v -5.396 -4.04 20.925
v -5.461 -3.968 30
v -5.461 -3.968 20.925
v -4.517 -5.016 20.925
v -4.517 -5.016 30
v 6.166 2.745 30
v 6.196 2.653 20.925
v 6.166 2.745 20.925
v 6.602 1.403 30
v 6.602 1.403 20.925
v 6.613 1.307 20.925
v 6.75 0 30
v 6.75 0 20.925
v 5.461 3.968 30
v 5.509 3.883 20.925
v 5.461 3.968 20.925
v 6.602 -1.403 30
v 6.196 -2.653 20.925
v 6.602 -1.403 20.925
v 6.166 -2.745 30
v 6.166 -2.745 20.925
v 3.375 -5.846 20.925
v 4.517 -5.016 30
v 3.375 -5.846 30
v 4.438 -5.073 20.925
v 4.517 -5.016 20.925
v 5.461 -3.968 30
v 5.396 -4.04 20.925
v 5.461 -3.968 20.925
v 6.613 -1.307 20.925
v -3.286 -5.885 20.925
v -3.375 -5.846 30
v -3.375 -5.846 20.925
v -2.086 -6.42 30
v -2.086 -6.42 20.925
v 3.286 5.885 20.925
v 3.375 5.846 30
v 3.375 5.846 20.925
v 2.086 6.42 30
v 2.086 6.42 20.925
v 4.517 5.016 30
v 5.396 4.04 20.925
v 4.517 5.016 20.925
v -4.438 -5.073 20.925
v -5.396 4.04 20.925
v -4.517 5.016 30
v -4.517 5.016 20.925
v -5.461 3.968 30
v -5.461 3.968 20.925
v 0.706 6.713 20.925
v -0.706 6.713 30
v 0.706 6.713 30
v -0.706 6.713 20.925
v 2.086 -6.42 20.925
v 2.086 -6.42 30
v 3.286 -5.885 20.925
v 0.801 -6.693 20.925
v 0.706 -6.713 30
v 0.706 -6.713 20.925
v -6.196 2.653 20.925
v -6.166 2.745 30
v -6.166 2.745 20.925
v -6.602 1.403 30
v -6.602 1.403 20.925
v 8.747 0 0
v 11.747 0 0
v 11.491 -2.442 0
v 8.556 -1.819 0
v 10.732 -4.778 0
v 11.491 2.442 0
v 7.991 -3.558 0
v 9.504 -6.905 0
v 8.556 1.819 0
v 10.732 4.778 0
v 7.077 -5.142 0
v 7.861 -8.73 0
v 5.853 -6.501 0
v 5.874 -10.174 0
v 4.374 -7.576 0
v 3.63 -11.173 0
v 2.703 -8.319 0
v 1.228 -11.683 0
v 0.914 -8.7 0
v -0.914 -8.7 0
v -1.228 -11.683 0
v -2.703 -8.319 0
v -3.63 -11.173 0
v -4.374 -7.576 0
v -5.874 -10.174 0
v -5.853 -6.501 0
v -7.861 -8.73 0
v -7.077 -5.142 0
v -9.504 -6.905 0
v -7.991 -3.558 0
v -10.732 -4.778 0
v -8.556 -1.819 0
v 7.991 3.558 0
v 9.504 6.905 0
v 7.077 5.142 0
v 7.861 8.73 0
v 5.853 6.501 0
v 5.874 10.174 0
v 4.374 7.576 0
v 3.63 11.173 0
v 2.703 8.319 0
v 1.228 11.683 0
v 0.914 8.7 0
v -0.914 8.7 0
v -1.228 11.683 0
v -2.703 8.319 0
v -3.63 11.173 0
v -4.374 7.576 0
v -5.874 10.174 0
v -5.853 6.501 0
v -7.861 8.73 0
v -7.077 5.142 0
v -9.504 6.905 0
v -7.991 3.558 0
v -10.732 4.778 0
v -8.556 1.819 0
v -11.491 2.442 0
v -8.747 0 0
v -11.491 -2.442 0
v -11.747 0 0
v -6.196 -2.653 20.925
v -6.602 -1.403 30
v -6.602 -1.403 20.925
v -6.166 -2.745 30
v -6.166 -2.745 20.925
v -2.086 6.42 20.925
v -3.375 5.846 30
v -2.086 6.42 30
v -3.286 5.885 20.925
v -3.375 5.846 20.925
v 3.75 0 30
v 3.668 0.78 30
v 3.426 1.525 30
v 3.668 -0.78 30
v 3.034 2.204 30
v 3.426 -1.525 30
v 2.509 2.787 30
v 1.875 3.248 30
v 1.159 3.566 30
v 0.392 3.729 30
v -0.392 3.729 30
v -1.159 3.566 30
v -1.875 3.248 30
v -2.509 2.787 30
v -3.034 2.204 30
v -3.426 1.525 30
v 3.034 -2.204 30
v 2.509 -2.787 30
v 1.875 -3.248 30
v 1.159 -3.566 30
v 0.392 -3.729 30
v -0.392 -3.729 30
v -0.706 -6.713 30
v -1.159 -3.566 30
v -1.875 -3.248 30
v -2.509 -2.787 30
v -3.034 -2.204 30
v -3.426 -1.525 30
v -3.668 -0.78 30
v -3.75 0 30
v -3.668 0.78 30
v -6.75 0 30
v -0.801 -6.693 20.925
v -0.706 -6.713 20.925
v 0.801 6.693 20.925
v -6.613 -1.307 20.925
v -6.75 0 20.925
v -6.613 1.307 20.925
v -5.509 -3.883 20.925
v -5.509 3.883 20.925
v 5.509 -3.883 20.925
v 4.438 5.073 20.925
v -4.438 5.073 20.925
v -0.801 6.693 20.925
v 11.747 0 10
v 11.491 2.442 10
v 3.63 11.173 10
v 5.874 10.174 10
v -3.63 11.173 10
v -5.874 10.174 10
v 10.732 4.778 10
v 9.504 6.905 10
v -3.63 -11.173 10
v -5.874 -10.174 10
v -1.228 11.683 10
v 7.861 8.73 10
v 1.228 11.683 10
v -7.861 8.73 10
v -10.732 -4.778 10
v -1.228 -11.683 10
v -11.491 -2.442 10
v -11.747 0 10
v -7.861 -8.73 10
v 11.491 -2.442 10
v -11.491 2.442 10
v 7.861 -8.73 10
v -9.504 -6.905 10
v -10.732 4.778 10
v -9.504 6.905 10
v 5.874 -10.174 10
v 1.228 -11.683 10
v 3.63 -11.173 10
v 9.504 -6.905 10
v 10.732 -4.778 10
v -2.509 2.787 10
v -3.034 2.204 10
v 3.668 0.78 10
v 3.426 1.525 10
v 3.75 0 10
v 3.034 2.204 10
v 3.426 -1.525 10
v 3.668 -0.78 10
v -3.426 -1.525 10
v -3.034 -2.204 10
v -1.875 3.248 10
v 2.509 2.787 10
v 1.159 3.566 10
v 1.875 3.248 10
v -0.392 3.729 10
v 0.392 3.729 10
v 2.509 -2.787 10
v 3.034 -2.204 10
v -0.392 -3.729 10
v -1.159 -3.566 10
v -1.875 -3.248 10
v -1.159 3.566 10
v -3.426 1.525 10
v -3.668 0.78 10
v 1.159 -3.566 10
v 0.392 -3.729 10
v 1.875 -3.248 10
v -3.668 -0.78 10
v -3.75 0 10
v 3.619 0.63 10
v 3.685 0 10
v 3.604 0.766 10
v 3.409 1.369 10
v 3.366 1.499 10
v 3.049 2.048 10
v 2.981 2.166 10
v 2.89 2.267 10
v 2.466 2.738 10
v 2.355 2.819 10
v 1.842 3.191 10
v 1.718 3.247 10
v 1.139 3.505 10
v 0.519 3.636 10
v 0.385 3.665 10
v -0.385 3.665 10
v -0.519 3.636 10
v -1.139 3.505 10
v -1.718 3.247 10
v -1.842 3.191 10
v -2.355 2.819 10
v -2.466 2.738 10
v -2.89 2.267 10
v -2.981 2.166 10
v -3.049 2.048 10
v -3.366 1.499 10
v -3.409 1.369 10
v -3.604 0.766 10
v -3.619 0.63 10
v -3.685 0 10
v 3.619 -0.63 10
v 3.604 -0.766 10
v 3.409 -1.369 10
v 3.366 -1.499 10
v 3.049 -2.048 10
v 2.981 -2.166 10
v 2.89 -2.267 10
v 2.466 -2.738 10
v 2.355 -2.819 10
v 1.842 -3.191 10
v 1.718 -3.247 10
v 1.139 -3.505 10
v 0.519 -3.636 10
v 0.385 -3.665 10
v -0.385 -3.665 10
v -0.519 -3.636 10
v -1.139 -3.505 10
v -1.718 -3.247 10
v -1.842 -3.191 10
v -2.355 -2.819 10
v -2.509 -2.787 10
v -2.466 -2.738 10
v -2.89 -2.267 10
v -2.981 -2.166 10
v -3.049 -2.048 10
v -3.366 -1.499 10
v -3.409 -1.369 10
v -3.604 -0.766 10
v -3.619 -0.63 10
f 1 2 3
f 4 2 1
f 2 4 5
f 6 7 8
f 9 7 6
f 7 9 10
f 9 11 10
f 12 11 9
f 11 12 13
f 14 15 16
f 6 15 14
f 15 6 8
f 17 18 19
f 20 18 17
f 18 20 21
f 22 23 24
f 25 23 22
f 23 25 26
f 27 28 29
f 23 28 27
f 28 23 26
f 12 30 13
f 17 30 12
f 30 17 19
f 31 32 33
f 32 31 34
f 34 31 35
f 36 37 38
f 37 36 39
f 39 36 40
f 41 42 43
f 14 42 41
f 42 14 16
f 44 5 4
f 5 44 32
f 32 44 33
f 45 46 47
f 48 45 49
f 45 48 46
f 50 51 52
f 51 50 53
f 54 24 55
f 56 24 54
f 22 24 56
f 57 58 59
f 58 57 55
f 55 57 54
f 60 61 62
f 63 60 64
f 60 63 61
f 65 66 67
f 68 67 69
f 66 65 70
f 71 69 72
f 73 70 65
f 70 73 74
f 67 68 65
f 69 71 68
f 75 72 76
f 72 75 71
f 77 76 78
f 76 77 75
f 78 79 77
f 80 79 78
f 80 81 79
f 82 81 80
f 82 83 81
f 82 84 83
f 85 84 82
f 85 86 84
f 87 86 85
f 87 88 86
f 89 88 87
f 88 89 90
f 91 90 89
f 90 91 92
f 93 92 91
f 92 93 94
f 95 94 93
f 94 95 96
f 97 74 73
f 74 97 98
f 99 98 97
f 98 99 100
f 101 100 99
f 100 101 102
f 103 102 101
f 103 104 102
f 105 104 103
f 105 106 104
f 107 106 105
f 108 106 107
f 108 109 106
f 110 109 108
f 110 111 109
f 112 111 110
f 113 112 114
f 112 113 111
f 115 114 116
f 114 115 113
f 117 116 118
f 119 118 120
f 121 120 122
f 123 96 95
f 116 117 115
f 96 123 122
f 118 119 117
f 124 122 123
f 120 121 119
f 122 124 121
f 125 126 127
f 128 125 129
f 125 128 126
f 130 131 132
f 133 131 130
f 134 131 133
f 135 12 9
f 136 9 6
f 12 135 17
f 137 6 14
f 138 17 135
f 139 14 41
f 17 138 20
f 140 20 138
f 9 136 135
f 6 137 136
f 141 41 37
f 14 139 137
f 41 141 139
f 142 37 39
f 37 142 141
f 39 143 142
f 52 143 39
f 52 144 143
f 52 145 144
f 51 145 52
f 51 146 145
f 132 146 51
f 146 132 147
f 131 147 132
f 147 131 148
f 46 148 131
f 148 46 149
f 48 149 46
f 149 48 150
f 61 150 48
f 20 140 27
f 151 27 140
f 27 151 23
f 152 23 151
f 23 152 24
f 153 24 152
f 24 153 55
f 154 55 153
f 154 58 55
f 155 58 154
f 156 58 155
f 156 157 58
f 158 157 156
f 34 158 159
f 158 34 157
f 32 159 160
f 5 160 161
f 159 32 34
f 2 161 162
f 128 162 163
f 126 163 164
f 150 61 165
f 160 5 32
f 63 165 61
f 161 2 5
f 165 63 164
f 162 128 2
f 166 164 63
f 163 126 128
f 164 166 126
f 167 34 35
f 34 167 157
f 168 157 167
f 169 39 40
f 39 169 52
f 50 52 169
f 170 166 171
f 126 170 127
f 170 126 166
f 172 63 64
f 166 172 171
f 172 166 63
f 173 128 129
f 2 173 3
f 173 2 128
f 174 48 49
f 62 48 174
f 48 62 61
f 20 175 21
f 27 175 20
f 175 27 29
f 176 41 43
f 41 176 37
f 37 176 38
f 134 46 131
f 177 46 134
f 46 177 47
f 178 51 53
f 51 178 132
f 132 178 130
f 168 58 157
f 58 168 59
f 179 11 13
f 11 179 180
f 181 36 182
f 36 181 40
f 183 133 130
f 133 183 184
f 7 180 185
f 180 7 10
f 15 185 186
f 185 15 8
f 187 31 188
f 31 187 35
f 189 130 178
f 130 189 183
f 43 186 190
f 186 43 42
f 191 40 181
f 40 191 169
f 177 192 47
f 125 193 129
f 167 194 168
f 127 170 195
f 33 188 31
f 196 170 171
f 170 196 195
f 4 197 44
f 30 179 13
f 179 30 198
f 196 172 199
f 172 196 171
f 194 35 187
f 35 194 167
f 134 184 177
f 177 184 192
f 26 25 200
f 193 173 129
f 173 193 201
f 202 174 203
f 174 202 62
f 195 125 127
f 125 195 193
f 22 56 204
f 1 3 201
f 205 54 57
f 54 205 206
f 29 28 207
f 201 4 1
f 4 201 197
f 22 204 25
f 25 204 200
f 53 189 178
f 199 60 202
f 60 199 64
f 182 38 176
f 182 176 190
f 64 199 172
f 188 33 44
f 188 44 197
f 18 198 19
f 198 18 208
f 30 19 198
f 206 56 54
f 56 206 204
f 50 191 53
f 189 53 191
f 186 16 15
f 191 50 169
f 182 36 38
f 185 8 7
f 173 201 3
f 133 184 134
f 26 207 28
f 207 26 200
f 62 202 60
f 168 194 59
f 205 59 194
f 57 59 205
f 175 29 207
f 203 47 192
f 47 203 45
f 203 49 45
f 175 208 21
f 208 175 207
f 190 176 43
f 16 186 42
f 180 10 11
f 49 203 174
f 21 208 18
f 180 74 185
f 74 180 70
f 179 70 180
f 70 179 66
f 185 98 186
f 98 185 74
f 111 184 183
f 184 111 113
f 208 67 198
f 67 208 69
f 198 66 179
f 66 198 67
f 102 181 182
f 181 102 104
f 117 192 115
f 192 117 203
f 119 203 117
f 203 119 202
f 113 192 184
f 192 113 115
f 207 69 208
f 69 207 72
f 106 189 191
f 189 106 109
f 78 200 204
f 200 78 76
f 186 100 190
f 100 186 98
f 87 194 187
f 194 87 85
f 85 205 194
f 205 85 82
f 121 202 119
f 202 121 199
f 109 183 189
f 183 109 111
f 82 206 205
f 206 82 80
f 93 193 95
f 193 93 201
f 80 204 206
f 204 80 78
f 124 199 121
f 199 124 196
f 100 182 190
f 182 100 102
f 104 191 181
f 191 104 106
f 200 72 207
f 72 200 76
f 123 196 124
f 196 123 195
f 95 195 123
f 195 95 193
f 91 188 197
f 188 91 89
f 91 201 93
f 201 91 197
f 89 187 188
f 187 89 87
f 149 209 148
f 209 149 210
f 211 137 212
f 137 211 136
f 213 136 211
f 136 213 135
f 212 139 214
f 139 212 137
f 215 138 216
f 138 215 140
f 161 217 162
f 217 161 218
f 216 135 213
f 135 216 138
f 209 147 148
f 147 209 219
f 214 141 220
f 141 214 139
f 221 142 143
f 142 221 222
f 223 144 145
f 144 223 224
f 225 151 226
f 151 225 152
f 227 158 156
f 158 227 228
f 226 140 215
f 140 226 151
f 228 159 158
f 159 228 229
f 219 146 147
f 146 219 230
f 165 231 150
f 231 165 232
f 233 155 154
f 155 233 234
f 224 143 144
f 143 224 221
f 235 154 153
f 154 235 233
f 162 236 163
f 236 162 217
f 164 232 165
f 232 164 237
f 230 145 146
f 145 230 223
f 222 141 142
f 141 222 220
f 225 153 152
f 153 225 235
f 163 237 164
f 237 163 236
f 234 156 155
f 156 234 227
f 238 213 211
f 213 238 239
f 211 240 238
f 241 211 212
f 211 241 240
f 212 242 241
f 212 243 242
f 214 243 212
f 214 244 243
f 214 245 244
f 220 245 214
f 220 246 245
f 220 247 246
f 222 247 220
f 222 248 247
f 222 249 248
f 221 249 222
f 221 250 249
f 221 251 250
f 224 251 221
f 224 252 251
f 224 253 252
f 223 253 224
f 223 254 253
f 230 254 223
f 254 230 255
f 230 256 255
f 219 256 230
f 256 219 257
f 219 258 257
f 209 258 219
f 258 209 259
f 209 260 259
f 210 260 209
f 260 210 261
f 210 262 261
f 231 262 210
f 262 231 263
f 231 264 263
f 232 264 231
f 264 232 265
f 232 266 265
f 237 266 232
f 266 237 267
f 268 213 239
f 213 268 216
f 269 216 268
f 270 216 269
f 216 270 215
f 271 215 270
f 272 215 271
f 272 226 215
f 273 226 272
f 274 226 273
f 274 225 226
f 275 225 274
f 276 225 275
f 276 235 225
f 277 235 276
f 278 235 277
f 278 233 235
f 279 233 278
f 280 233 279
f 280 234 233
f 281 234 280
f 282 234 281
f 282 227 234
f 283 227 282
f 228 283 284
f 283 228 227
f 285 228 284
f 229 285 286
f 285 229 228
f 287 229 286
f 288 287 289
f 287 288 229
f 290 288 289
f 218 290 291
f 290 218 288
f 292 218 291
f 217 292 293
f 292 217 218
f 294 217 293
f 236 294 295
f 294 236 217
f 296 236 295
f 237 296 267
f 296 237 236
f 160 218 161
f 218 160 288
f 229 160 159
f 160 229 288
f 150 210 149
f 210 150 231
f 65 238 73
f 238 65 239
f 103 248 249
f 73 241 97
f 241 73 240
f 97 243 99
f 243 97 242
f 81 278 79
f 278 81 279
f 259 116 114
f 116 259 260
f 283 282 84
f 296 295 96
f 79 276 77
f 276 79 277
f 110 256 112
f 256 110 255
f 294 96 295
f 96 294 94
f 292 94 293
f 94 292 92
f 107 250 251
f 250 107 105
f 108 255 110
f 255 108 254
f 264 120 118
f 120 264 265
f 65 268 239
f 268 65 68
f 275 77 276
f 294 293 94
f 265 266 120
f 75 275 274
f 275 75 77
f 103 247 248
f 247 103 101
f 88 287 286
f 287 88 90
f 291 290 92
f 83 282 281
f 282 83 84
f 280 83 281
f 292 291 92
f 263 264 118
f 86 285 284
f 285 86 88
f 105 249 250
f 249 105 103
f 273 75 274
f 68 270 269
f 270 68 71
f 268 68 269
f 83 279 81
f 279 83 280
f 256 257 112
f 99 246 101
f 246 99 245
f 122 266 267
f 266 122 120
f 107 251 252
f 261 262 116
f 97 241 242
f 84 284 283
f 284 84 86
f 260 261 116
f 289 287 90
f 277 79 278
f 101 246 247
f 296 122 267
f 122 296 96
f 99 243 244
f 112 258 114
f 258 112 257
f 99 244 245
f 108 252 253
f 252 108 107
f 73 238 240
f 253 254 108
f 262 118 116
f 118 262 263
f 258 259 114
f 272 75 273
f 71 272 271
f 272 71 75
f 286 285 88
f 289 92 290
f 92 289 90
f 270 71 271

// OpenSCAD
boreDiameter = 0.925*25.4;
baseHeight = 10;

coreDiameter = 7.5;
coreHeight   = 20;
wall = 3;

$fs=0.02;

render()
difference() {
  union() {
    
    // Core
    cylinder(r=(coreDiameter/2)+wall, h=coreHeight+baseHeight);
    
    // Base Taper
    translate([0,0,baseHeight])
    cylinder(r1=boreDiameter/2, h=boreDiameter);
    
    // Base
    cylinder(r=boreDiameter/2, h=baseHeight);
  }
  
  translate([0,0,baseHeight])
  cylinder(r=(coreDiameter/2), h=coreHeight+baseHeight);
  
  // Base Taper
  cylinder(r1=(boreDiameter/2)-wall, h=baseHeight+(coreDiameter*sqrt(2)/2));
}
